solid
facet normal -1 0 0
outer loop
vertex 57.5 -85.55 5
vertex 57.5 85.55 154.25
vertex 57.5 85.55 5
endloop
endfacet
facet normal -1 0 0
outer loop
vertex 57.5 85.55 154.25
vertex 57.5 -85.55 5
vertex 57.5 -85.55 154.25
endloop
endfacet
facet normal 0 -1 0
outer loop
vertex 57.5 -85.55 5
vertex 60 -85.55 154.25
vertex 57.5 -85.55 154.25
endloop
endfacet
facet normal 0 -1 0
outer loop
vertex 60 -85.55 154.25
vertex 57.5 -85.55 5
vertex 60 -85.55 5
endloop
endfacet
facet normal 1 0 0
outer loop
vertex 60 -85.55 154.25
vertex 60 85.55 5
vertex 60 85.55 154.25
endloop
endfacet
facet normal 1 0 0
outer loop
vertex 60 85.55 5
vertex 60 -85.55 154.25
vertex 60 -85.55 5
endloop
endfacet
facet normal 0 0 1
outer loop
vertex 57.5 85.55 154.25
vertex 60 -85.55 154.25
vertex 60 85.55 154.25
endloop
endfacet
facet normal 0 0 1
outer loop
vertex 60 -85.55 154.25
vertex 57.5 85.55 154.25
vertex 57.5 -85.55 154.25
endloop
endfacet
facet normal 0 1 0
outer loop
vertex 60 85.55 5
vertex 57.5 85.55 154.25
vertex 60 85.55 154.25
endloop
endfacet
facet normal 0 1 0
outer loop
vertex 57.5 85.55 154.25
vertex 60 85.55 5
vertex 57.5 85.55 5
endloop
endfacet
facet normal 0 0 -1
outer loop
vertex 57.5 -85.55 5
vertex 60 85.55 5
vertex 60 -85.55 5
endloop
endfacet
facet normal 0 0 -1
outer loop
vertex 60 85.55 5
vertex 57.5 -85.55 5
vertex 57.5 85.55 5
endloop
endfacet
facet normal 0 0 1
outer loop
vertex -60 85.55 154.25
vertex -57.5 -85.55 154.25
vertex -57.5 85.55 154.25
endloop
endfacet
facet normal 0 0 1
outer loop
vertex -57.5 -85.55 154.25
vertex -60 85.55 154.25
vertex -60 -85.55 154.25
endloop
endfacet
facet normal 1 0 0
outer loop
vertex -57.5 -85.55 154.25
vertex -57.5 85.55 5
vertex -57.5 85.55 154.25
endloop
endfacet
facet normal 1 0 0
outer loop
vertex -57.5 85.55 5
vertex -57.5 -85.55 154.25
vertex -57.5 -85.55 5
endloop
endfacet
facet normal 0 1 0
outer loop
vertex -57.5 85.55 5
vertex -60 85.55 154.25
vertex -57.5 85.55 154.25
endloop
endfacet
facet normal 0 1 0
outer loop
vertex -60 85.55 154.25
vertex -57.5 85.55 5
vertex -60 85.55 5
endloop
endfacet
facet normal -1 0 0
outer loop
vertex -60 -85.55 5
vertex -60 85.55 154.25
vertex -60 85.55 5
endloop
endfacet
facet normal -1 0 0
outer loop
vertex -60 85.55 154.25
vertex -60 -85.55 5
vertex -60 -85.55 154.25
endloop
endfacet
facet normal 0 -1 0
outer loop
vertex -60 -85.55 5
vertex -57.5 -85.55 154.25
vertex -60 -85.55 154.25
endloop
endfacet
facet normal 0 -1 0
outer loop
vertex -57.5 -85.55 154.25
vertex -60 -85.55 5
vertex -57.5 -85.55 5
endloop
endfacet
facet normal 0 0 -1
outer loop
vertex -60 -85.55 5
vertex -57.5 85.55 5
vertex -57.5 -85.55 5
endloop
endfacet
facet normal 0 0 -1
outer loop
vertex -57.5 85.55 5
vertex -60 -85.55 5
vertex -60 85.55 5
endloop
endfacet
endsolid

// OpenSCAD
// file: project_vars.scad
// global config

box_depth = 141.1;      // dist. btwn. fan/pwr & frnt vent
box_width = 85;         // box width when fan positioned at top left
box_height = 149.25;    // box height when fan positioned at top left
wire_dia = 20;          // wire exit hole (harness to traffic light)
wire_grace = 30;         // extra room for wires n' shit
rot_switch_dia = 5;     // display rotate switch hole diameter on back panel
pwr_switch_dia = 12.5;  // power switch hole diameter in front panel
slit_height = 5;        // height of each vent slit
slit_spacing = 5;       // distance between each vent slit
box_hmargin = 10;       // in general, horizontal margin of the box
box_vmargin = 10;       // in general, vertical margin of the box
tooth_sz = 5;           // size of individual teeth
psu_lip = 5;            // the lip around the power supply on the back panel
// main file
include <project_vars.scad>;

// Camera Settings
$vpt = [0, 0, 70];
$vpr = [55, 0, 25];
$vpd = 900;

module import_panel(name) {
  linear_extrude(tooth_sz) {
    import(name);
  }
}

explode = 35 * (1 - cos($t * 360)) / 2;
rotation = $t * -720;

rotate([0, 0, rotation]) {
  translate([-(box_width + wire_grace)/2, -(box_depth + wire_grace)/2, 0]) {

    translate([0, 0, -explode]) {
      import_panel("panel_bottom.dxf");
    }

    translate([0, box_depth + wire_grace + tooth_sz + explode, tooth_sz]) {
      rotate([90, 0, 0]) {
        import_panel("panel_front.dxf");
      }
    }

    translate([0, -explode, tooth_sz]) {
      rotate([90, 0, 0]) {
        import_panel("panel_back.dxf");
      }
    }

    translate([box_width + wire_grace + explode, 0, tooth_sz]) {
      rotate([90, 0, 90]) {
        linear_extrude(tooth_sz * 0.5) {
          square([box_depth + wire_grace, box_height]);
        }
        import_panel("panel_side.dxf");
      }
    }

    translate([-explode, box_depth + wire_grace, tooth_sz]) {
      rotate([-90, 180, 90]) {
        linear_extrude(tooth_sz * 0.5) {
          square([box_depth + wire_grace, box_height]);
        }
        import_panel("panel_side.dxf");
      }
    }

    translate([0, 0, box_height + tooth_sz + explode]) {
      import_panel("panel_top.dxf");
    }

  }
}
